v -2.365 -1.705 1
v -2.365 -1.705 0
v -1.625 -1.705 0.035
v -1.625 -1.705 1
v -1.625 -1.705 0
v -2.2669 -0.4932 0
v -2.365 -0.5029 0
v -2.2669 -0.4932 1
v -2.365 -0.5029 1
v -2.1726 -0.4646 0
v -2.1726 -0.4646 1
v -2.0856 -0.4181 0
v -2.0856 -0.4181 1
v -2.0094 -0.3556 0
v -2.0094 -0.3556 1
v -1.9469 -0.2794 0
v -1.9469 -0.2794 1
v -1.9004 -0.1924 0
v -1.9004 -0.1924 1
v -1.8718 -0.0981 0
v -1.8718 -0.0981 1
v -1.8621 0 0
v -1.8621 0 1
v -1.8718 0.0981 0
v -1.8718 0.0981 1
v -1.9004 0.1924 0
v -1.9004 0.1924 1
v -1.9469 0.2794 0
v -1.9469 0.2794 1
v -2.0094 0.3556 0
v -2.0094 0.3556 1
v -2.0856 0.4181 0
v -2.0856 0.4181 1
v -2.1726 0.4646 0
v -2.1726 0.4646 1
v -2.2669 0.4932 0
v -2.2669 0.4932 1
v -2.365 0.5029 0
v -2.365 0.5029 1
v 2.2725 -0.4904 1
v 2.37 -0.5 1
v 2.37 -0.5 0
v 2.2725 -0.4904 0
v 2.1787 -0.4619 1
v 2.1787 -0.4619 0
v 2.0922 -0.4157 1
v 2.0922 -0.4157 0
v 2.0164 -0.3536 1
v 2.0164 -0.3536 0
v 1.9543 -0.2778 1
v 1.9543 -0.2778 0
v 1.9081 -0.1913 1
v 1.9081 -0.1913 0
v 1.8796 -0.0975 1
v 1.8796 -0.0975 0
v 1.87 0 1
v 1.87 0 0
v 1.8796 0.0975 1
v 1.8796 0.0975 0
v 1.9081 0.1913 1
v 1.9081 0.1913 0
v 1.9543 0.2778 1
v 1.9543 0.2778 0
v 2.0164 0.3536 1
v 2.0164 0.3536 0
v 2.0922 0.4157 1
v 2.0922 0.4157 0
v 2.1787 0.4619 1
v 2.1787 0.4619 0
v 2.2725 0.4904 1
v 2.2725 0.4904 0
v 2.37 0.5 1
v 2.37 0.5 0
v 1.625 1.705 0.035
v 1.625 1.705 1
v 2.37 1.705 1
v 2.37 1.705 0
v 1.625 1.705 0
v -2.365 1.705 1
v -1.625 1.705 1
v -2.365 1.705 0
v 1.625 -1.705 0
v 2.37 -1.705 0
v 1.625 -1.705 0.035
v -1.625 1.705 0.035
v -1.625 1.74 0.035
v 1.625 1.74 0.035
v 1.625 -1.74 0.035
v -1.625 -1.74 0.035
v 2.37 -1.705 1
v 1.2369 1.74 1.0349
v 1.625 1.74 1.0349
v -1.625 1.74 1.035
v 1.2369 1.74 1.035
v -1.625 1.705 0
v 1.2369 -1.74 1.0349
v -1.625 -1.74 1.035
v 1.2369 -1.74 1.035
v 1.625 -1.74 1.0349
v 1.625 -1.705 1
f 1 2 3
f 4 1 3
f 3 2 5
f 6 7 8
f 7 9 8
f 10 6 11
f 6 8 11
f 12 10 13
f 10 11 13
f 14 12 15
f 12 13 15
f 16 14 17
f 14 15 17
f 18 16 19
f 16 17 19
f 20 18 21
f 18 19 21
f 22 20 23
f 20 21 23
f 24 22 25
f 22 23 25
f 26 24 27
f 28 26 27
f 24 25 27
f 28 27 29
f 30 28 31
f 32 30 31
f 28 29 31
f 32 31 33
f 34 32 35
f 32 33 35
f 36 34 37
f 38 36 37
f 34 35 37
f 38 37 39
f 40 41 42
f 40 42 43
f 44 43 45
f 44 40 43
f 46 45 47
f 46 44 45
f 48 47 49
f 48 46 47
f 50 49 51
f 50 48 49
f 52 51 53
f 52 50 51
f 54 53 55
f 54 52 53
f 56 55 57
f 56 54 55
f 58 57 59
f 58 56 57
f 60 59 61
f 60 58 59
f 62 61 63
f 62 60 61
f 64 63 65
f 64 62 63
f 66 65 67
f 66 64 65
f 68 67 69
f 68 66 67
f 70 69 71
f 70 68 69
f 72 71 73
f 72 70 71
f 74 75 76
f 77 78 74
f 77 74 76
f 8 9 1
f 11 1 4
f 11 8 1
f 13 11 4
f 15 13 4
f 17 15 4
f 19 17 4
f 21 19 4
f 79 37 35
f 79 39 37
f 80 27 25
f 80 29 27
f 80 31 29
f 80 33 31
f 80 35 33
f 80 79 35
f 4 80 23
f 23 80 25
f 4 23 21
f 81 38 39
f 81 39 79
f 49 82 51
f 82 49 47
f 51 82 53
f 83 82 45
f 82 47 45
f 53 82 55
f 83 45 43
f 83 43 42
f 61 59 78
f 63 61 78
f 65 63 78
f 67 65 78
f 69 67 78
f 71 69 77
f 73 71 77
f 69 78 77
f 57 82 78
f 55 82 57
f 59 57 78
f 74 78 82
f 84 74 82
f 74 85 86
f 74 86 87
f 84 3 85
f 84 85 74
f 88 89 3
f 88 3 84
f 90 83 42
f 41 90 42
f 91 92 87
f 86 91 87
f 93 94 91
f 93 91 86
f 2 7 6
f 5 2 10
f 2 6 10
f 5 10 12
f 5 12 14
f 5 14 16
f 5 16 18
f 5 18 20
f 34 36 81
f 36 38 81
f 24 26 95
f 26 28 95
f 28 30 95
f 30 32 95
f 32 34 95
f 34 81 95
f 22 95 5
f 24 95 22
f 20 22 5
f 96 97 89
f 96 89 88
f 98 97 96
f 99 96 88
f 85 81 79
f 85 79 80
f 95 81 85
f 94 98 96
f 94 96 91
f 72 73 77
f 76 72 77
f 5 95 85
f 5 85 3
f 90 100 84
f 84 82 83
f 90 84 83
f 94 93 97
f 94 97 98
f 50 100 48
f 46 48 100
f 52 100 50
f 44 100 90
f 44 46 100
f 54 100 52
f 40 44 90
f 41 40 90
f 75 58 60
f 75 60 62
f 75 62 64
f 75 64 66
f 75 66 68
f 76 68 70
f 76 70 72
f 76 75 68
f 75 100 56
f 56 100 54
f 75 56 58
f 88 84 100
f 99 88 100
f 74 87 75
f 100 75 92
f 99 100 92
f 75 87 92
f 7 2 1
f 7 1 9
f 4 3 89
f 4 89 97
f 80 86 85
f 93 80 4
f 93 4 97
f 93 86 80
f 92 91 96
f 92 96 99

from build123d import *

# Parameters (mm, degrees)
ESQUISSE1_W             = 4.735
ESQUISSE1_H             = 3.41
EXTRUSION1_DEPTH        = 1
ESQUISSE2_R             = 0.5
ENL_V_MAT_EXTRU_1_DEPTH = 1
ESQUISSE4_R             = 0.502851751
ENL_V_MAT_EXTRU_2_DEPTH = 1
ESQUISSE8_W             = 3.25
ESQUISSE8_H             = 3.41
EXTRUSION3_DEPTH        = 0.035
ESQUISSE10_W            = 3.25
ESQUISSE10_H            = 1.035
EXTRUSION5_DEPTH        = 0.035
ESQUISSE11_W            = 3.25
ESQUISSE11_H            = 1.035
EXTRUSION6_DEPTH        = 0.035
ESQUISSE12_W            = 3.25
ESQUISSE12_H            = 3.48
ENL_V_MAT_EXTRU_6_DEPTH = 0.035
ESQUISSE13_W            = 0.388132222
ESQUISSE13_H            = 3.48
ENL_V_MAT_EXTRU_7_DEPTH = 0.0001


with BuildPart() as part:
    # Esquisse1 → Extrusion1 (new body)
    with BuildSketch(Plane.XY):
        with Locations((0.0025, 0)):
            Rectangle(ESQUISSE1_W, ESQUISSE1_H)
    extrude(amount=EXTRUSION1_DEPTH)

    # Esquisse2 → Enlèv. mat.-Extru.1 (cut)
    with BuildSketch(Plane(origin=(1.48, 0, 1), x_dir=(0, 1, 0), z_dir=(0, 0, -1))):
        with Locations((0, 0.89)):
            Circle(ESQUISSE2_R)
    extrude(amount=ENL_V_MAT_EXTRU_1_DEPTH, mode=Mode.SUBTRACT)

    # Esquisse4 → Enlèv. mat.-Extru.2 (cut)
    with BuildSketch(Plane.XY.offset(1)):
        with Locations((-2.365, 0)):
            Circle(ESQUISSE4_R)
    extrude(amount=-ENL_V_MAT_EXTRU_2_DEPTH, mode=Mode.SUBTRACT)

    # Esquisse8 → Extrusion3 (add)
    with BuildSketch(Plane.XY.offset(1)):
        Rectangle(ESQUISSE8_W, ESQUISSE8_H)
    extrude(amount=EXTRUSION3_DEPTH)

    # Esquisse10 → Extrusion5 (add)
    with BuildSketch(Plane(origin=(0, 1.705, 0), x_dir=(-1, 0, 0), z_dir=(0, 1, 0))):
        with Locations((0, 0.5175)):
            Rectangle(ESQUISSE10_W, ESQUISSE10_H)
    extrude(amount=EXTRUSION5_DEPTH)

    # Esquisse11 → Extrusion6 (add)
    with BuildSketch(Plane.XZ.offset(1.705)):
        with Locations((0, 0.5175)):
            Rectangle(ESQUISSE11_W, ESQUISSE11_H)
    extrude(amount=EXTRUSION6_DEPTH)

    # Esquisse12 → Enlèv. mat.-Extru.6 (cut)
    with BuildSketch(Plane(origin=(0, 0, 0), x_dir=(1, 0, 0), z_dir=(0, 0, -1))):
        Rectangle(ESQUISSE12_W, ESQUISSE12_H)
    extrude(amount=-ENL_V_MAT_EXTRU_6_DEPTH, mode=Mode.SUBTRACT)

    # Esquisse13 → Enlèv. mat.-Extru.7 (cut)
    with BuildSketch(Plane.XY.offset(1.035)):
        with Locations((1.430933889, 0)):
            Rectangle(ESQUISSE13_W, ESQUISSE13_H)
    extrude(amount=-ENL_V_MAT_EXTRU_7_DEPTH, mode=Mode.SUBTRACT)


solid = part.part
